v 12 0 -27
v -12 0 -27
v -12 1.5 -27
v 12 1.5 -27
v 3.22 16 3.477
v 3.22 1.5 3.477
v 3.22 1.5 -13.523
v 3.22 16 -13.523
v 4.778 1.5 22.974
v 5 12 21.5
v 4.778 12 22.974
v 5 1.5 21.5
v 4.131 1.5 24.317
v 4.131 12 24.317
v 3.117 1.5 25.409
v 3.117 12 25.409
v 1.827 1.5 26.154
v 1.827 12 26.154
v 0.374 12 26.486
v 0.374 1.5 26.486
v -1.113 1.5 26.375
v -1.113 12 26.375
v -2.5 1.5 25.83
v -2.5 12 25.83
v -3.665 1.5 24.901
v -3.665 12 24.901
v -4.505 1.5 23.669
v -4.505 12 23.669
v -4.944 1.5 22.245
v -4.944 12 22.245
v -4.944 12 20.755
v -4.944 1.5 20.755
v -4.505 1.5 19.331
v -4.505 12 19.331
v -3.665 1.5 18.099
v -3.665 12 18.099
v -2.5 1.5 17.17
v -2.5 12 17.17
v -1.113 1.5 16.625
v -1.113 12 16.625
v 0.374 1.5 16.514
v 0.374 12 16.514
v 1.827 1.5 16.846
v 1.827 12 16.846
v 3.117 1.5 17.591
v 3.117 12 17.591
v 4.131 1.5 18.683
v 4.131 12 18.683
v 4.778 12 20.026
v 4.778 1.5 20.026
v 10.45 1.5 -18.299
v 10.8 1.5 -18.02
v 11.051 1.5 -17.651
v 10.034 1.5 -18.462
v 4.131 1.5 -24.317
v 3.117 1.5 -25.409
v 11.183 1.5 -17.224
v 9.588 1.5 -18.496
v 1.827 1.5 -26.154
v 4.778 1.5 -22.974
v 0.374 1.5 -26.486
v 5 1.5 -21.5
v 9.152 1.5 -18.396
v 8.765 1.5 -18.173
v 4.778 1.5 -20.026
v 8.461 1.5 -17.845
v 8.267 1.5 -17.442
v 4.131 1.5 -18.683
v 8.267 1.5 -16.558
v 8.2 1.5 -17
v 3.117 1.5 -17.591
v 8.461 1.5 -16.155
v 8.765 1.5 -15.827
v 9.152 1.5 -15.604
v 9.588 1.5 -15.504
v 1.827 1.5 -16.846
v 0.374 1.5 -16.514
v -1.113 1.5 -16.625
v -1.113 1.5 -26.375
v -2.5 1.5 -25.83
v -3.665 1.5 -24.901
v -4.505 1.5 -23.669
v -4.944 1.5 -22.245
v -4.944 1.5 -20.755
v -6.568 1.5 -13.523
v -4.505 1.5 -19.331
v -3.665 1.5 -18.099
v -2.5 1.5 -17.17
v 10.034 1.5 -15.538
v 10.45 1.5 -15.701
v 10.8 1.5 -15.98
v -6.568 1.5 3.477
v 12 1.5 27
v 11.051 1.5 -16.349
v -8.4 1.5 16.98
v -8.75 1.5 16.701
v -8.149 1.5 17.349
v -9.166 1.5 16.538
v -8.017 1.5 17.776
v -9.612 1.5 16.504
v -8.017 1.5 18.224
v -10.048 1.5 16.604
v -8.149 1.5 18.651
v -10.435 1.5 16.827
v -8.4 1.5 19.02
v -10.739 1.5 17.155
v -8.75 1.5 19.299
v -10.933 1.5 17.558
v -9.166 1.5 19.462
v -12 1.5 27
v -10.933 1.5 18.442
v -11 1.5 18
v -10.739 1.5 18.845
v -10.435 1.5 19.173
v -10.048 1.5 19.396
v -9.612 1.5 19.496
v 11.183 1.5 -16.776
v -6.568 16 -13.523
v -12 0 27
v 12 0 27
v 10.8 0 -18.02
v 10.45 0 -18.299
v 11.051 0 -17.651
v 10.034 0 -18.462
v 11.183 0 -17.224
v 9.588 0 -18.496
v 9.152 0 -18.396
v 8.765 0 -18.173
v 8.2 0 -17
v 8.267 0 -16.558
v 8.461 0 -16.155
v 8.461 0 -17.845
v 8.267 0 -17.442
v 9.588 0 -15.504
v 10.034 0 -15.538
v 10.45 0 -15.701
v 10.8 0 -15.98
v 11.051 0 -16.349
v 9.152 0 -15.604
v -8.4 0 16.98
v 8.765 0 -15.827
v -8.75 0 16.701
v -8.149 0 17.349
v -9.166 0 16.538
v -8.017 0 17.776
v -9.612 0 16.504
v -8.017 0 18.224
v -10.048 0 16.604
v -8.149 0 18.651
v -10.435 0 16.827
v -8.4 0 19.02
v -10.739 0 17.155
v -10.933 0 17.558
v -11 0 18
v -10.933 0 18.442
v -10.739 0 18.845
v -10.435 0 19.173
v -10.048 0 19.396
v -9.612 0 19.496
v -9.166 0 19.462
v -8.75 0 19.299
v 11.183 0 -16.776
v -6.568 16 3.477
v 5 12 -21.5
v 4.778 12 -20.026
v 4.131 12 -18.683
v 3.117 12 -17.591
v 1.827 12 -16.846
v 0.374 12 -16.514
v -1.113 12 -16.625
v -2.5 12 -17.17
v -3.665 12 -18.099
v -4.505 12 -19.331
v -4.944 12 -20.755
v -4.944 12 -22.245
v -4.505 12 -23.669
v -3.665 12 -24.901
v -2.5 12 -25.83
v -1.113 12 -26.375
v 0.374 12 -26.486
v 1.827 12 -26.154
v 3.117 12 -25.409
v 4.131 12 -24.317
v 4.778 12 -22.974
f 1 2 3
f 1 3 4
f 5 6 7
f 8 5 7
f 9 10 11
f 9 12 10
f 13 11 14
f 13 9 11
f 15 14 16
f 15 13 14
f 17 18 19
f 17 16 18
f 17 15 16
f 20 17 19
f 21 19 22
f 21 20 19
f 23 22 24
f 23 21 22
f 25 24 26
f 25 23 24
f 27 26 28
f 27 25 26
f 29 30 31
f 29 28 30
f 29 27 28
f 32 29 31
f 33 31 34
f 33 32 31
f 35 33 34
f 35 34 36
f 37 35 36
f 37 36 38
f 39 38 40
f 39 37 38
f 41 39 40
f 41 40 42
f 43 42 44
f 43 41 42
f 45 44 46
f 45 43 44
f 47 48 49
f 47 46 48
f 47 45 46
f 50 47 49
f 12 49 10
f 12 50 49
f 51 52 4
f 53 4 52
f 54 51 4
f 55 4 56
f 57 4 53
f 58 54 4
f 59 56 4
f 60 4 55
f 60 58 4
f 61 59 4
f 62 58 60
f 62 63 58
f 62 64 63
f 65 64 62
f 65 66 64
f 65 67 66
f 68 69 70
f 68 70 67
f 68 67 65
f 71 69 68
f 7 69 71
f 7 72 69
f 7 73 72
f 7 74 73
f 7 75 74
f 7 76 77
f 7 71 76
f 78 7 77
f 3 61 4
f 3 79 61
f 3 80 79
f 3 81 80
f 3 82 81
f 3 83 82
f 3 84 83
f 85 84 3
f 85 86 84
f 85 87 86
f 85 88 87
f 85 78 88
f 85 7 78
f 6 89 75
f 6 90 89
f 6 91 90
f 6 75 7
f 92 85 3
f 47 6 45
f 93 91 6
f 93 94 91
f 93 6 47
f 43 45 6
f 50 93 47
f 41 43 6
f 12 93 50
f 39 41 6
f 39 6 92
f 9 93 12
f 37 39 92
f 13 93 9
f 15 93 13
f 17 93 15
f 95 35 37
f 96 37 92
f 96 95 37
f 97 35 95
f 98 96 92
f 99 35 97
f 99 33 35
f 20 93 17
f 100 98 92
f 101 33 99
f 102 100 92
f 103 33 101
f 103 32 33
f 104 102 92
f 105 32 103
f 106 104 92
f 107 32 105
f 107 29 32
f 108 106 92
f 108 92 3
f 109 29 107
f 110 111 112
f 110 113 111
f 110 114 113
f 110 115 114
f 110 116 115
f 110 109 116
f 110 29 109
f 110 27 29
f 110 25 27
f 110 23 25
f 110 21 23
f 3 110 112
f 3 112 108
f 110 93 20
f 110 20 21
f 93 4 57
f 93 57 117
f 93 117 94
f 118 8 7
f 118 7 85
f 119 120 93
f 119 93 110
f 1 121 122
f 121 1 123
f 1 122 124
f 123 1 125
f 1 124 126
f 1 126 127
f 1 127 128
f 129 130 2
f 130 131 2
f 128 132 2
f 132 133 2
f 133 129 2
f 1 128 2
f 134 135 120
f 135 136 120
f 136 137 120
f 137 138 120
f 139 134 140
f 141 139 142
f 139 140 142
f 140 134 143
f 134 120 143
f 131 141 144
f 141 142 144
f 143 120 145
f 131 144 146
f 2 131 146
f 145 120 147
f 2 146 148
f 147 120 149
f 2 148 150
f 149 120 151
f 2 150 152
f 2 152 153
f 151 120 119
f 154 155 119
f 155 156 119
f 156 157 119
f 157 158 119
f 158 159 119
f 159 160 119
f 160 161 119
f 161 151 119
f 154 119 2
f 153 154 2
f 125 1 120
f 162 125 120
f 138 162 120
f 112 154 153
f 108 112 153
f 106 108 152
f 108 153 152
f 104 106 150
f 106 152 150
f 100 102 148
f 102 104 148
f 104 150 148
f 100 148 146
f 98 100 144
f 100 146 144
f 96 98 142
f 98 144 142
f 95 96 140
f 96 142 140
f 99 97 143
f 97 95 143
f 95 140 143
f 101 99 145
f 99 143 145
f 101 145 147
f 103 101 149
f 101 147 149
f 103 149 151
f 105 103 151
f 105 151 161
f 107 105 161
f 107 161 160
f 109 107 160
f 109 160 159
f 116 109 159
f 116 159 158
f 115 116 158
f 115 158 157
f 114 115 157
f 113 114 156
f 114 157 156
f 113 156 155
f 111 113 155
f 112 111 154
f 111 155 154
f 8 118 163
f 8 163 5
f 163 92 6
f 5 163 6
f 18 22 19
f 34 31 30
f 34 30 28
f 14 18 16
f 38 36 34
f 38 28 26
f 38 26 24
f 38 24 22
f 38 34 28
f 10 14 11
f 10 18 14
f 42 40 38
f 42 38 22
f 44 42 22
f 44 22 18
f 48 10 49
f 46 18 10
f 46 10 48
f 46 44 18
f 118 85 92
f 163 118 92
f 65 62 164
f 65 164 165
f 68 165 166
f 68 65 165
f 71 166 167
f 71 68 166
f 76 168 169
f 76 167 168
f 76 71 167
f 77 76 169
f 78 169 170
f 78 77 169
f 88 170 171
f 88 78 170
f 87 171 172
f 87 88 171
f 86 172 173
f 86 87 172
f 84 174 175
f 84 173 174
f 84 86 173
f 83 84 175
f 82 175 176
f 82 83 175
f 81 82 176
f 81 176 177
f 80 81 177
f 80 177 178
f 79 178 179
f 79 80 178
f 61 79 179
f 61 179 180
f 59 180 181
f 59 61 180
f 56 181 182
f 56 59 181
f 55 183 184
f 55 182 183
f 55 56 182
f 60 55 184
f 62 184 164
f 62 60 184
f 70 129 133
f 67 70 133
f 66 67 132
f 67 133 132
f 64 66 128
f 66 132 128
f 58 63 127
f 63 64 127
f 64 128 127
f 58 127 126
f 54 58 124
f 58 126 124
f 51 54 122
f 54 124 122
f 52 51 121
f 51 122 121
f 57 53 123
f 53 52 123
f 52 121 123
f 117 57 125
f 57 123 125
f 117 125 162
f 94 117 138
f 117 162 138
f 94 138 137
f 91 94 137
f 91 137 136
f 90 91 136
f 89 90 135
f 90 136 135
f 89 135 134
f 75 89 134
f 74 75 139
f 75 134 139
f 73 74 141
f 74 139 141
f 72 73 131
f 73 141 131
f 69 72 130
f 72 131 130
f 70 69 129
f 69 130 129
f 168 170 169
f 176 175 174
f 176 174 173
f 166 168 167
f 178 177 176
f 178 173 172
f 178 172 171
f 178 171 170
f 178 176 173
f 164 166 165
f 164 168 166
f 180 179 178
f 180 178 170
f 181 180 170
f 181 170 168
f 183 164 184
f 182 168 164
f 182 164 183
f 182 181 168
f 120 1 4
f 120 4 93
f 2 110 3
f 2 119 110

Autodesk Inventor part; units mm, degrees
ref_plane "YZ Plane" through (0, 0, 0) normal (1, 0, 0) x (0, 1, 0)
ref_plane "XZ Plane" through (0, 0, 0) normal (0, 1, 0) x (-1, 0, 0)
ref_plane "XY Plane" through (0, 0, 0) normal (0, 0, 1) x (1, 0, 0)
sketch "스케치1" plane through (0, 0, 0) normal (0, 1, 0) x (-1, 0, 0)
  line L0 (-12, 27) -> (12, 27)
  line L1 (12, 27) -> (12, -27)
  line L2 (12, -27) -> (-12, -27)
  line L3 (-12, -27) -> (-12, 27)
  line L4 (-12, 27) -> (12, -27) construction
  line L5 (12, 27) -> (-12, -27) construction
  circle A0 centre (9.5, 18) radius 1.5
  circle A1 centre (-9.7, -17) radius 1.5
  point P0 (0, 0)
  dimension "d0" = 24
  dimension "d1" = 54
  dimension "d2" = 3
  dimension "d3" = 9
  dimension "d4" = 2.5
  dimension "d5" = 3
  dimension "d6" = 10
  dimension "d7" = 2.3
extrude "돌출1" add sketch "스케치1" along normal blind 1.5
sketch "스케치2" plane through (0, 1.5, 0) normal (0, 1, 0) x (1, 0, 0)
  circle A0 centre (0, -21.5) radius 5
  circle A1 centre (0, 21.5) radius 5
  line L0 (12, 27) -> (-12, 27) projected
  line L1 (-12, -27) -> (12, -27) projected
  point P0 (0, 0)
  dimension "d10" = 10
  dimension "d11" = 5.5
  dimension "d12" = 5.5
  dimension "d13" = 10
extrude "돌출2" add sketch "스케치2" along normal blind 10.5
sketch "스케치3" plane through (0, 1.5, 0) normal (0, 1, 0) x (1, 0, 0)
  line L0 (-6.5682, -3.4773) -> (3.2197, -3.4773)
  line L1 (3.2197, -3.4773) -> (3.2197, 13.5227)
  line L2 (3.2197, 13.5227) -> (-6.5682, 13.5227)
  line L3 (-6.5682, 13.5227) -> (-6.5682, -3.4773)
  line L4 (-6.5682, -3.4773) -> (3.2197, 13.5227) construction
  line L5 (3.2197, -3.4773) -> (-6.5682, 13.5227) construction
  point P0 (0, 0)
  point P1 (-1.6742, 5.0227)
  dimension "d16" = 17
extrude "돌출3" add sketch "스케치3" along normal blind 14.5
properties part number "스텝다운 컨버터"
